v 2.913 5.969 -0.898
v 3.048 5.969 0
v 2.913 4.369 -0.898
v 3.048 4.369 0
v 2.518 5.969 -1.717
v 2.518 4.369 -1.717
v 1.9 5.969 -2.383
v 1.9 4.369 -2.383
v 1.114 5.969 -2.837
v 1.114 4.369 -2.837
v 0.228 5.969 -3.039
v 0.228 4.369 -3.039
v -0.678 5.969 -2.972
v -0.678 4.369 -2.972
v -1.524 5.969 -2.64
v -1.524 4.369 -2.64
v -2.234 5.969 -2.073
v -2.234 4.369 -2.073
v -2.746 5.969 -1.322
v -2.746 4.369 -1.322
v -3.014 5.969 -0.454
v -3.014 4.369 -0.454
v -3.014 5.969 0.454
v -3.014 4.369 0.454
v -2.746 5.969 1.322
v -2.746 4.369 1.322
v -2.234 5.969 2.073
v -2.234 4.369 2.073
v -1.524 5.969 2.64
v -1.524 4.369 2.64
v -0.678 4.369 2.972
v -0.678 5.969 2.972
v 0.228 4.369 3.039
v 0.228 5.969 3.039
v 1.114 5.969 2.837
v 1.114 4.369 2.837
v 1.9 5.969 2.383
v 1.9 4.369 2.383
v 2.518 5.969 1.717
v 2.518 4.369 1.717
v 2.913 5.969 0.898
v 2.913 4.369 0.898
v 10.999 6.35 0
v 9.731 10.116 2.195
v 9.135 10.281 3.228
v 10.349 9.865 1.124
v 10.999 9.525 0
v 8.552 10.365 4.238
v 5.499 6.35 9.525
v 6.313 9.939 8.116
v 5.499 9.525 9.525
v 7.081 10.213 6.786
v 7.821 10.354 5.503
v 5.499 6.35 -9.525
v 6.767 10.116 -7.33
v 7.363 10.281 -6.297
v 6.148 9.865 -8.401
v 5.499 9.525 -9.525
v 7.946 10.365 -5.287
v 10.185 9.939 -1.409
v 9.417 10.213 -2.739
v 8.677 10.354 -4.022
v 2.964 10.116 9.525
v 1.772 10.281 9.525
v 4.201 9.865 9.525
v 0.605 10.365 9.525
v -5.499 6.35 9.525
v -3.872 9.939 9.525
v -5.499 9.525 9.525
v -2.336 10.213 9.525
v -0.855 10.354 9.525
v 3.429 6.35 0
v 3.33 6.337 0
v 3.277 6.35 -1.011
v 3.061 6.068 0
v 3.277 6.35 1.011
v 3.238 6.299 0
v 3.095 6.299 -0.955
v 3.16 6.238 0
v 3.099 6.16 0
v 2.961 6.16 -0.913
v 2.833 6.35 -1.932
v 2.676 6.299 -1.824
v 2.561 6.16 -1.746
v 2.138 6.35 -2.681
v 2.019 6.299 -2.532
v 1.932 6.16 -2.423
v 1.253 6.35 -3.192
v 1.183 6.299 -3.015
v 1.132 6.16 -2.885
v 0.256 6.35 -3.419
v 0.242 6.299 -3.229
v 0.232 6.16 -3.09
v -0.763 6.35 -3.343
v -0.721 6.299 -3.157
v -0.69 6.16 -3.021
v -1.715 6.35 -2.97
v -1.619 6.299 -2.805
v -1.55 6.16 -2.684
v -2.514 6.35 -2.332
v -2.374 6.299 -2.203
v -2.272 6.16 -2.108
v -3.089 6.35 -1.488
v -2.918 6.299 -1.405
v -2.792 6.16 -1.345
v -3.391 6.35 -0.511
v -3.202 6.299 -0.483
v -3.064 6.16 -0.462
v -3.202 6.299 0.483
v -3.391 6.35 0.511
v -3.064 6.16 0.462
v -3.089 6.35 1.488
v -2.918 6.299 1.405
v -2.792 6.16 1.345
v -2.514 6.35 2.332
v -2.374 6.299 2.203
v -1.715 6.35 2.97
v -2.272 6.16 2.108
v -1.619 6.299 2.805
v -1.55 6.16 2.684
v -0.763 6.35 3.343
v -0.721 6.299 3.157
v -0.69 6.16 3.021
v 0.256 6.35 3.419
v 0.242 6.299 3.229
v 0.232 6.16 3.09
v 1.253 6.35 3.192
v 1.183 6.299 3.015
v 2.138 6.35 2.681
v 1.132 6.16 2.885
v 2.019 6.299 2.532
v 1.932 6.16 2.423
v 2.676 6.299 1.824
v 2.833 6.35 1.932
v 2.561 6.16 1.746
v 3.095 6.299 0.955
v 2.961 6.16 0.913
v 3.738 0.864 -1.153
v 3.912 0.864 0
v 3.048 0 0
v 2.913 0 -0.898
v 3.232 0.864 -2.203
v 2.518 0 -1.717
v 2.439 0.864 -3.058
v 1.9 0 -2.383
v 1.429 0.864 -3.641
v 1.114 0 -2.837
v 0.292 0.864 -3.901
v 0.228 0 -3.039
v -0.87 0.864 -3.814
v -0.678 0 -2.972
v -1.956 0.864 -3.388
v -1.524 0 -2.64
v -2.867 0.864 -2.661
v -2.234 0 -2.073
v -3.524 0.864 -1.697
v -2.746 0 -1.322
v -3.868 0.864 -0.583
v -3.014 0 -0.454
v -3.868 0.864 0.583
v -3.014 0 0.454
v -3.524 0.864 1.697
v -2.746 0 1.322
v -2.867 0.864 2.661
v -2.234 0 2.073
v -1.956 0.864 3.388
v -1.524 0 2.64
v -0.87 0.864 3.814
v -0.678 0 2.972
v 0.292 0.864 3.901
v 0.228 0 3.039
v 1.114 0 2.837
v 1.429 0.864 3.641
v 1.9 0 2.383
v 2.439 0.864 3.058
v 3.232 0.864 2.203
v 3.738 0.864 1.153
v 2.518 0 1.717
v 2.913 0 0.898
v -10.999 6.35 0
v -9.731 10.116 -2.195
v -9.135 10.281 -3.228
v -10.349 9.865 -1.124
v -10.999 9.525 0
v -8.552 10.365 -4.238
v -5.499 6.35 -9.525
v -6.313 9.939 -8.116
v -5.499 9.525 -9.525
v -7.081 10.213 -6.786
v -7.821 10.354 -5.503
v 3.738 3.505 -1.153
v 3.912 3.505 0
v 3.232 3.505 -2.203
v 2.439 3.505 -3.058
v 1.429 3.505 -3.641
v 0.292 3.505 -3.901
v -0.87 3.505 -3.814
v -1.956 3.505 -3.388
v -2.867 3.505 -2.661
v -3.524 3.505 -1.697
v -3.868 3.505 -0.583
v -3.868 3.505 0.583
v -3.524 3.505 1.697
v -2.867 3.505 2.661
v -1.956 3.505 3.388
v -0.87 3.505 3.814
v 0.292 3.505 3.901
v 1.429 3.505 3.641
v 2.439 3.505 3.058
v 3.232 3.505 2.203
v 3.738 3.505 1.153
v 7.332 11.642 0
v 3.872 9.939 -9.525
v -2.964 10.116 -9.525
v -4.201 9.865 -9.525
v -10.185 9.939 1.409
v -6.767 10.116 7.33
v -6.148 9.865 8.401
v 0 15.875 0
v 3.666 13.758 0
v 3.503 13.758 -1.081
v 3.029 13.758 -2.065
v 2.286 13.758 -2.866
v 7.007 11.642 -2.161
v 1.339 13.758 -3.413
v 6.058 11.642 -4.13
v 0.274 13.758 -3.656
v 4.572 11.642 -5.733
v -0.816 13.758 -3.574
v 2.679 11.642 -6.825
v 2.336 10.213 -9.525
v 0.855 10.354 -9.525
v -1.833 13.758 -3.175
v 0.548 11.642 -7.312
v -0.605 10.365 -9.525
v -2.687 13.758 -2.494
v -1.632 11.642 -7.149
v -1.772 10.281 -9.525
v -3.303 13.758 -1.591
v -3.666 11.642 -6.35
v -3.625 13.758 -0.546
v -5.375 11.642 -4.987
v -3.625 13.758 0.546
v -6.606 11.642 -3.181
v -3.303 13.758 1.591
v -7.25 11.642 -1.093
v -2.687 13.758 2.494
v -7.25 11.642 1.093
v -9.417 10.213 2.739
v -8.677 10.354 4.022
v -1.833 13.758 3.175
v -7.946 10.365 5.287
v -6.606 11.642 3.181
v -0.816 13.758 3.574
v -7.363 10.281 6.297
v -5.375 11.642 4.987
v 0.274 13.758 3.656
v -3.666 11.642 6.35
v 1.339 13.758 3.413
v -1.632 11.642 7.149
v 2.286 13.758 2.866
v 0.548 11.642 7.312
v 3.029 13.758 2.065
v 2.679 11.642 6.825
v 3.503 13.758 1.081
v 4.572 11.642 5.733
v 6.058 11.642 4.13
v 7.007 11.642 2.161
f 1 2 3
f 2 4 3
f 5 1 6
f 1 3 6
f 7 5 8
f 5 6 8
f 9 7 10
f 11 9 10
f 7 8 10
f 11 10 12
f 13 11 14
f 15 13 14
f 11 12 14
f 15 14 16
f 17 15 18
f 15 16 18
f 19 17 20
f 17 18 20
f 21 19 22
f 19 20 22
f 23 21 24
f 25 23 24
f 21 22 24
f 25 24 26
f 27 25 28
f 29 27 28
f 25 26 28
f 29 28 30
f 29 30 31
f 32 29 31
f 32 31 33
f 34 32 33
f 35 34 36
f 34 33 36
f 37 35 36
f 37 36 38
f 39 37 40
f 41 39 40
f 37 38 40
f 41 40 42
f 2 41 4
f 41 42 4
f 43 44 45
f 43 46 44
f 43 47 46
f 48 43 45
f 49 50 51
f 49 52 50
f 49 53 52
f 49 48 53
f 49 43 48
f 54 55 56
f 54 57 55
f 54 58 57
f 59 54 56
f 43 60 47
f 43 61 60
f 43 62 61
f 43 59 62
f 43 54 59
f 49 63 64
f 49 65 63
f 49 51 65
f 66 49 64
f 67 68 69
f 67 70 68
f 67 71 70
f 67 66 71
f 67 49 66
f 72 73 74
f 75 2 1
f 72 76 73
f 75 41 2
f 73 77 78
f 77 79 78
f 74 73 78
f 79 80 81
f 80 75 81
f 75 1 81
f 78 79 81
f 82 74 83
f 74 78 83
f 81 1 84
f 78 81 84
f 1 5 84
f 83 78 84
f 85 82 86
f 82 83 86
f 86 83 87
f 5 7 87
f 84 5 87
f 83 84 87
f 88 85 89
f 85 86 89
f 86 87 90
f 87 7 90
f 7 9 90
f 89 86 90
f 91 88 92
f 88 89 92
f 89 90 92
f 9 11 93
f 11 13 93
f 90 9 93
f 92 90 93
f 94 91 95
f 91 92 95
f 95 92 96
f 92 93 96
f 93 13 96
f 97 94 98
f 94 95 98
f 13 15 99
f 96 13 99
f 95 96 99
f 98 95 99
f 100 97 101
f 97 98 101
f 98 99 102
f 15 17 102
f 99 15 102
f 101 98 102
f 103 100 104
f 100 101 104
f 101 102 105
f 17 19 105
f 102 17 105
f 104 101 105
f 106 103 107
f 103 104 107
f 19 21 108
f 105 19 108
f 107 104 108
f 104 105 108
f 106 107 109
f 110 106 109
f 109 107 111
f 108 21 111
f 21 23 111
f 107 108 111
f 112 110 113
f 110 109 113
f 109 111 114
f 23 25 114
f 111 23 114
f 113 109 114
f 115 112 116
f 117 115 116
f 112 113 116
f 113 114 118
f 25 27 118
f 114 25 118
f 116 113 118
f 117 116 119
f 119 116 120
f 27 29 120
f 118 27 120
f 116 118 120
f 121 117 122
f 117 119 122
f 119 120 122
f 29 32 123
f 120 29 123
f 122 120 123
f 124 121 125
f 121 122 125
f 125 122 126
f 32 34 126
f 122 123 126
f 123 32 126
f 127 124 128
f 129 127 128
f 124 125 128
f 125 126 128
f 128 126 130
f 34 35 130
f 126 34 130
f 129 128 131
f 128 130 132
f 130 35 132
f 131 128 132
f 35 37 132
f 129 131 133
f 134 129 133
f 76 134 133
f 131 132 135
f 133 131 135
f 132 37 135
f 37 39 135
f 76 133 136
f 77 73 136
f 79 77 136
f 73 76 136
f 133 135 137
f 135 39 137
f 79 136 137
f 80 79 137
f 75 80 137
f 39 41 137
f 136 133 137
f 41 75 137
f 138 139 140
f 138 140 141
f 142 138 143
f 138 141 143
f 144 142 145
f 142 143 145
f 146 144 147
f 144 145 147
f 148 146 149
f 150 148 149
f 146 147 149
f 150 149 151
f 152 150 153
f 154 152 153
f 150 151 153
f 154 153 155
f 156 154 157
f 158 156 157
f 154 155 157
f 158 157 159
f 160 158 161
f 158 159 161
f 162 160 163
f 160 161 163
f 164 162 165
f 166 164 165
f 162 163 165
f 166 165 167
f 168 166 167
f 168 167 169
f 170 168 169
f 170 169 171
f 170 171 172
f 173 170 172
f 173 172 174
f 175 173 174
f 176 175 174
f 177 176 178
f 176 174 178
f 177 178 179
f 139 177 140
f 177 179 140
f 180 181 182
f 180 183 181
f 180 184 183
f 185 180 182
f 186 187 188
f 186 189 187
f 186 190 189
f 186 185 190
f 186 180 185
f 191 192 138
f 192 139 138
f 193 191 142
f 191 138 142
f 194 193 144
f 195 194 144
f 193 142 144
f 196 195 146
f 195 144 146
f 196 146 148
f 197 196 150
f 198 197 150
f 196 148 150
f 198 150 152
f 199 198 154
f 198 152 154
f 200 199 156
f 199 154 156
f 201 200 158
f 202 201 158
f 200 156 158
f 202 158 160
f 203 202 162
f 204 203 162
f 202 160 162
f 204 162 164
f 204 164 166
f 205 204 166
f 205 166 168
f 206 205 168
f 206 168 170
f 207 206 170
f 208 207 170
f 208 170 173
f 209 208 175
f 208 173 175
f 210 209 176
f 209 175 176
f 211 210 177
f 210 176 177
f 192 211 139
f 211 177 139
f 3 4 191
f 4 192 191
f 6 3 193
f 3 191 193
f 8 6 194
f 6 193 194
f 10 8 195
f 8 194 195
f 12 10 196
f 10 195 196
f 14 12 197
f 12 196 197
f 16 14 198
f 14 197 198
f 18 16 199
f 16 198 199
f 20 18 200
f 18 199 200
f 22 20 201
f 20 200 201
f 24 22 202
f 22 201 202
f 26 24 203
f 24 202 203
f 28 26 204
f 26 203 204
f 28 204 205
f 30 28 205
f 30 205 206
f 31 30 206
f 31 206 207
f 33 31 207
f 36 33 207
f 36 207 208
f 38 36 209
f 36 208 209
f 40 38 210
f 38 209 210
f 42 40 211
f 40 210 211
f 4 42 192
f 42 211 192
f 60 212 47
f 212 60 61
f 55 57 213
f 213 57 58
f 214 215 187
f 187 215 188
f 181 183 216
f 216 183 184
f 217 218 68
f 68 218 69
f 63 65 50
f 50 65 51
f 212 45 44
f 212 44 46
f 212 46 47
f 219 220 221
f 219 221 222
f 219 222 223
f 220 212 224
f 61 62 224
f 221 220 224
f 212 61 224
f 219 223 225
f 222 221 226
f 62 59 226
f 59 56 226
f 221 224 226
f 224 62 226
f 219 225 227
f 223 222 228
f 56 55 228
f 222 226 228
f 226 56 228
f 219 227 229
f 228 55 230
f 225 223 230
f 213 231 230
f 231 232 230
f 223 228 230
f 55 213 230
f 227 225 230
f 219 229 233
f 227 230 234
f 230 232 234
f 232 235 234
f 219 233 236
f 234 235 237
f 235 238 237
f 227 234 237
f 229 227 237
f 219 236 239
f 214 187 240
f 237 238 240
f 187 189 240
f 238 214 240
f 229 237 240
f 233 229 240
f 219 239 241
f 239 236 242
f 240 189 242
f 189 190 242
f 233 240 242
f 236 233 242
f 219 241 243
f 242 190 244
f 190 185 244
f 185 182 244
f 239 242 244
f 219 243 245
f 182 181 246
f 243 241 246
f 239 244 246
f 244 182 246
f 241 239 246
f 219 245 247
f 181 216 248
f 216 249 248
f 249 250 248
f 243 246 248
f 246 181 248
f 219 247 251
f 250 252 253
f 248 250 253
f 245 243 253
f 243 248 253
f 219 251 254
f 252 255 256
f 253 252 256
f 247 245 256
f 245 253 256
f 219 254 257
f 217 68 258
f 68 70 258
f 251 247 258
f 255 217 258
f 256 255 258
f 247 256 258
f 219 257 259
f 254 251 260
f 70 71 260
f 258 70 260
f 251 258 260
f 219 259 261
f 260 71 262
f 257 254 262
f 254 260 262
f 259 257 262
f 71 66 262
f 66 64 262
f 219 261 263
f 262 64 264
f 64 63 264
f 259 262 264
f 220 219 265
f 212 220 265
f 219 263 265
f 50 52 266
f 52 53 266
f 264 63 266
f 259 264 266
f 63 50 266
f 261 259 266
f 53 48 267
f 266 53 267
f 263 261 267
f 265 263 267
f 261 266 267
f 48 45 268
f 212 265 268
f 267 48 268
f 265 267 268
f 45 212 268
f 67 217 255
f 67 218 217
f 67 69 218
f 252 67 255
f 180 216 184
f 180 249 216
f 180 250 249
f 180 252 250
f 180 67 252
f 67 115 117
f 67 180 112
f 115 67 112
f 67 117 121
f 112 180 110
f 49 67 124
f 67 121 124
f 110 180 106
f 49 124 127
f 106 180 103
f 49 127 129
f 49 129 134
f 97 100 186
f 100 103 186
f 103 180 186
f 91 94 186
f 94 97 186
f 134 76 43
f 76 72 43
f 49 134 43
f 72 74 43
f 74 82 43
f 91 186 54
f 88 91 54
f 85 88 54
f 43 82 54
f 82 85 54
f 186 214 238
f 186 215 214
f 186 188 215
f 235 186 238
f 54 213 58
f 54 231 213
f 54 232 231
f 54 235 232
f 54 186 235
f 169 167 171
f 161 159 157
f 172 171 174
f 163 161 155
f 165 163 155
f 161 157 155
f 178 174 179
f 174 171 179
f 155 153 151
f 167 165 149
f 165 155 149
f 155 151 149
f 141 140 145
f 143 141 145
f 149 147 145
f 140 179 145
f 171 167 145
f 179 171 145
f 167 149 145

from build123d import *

# Parameters (mm, degrees)
CUT_EXTRUDE2_DEPTH = 15.875


with BuildPart() as part:
    # Sketch3 → Revolve1 (revolve)
    with BuildSketch(Plane.XY):
        with BuildLine():
            Line((0, 15.875), (10.9985175, 9.525002961))
            Line((10.9985175, 9.525002961), (10.9985175, 6.35))
            Line((10.9985175, 6.35), (3.429, 6.35))
            ThreePointArc((3.429, 6.35), (3.159592316, 6.238407684), (3.048, 5.969))
            Line((3.048, 5.969), (3.048, 4.3688))
            Line((3.048, 4.3688), (3.9116, 3.5052))
            Line((3.9116, 3.5052), (3.9116, 0.8636))
            Line((3.9116, 0.8636), (3.048, 0))
            Line((3.048, 0), (0, 0))
            Line((0, 0), (0, 15.875))
        make_face()
    revolve(axis=Axis((0, -1000, 0), (0, 1, 0)))

    # Sketch1 → Cut-Extrude2 (cut)
    with BuildSketch(Plane(origin=(0, 0, 0), x_dir=(1, 0, 0), z_dir=(0, 1, 0))):
        with BuildLine():
            ThreePointArc((-5.499261314, -9.525), (0, -10.998522628), (5.499261314, -9.525))
            Line((5.499261314, -9.525), (-5.499261314, -9.525))
        make_face()
        with BuildLine():
            ThreePointArc((-10.998522628, 0), (-9.525, -5.499261314), (-5.499261314, -9.525))
            Line((-5.499261314, -9.525), (-10.998522628, 0))
        make_face()
        with BuildLine():
            ThreePointArc((5.499261314, -9.525), (9.525, -5.499261314), (10.998522628, 0))
            Line((10.998522628, 0), (5.499261314, -9.525))
        make_face()
        with BuildLine():
            Line((5.499261314, 9.525), (10.998522628, 0))
            ThreePointArc((10.998522628, 0), (9.525, 5.499261314), (5.499261314, 9.525))
        make_face()
        with BuildLine():
            Line((-5.499261314, 9.525), (5.499261314, 9.525))
            ThreePointArc((5.499261314, 9.525), (0, 10.998522628), (-5.499261314, 9.525))
        make_face()
        with BuildLine():
            Line((-10.998522628, 0), (-5.499261314, 9.525))
            ThreePointArc((-5.499261314, 9.525), (-9.525, 5.499261314), (-10.998522628, 0))
        make_face()
    extrude(amount=CUT_EXTRUDE2_DEPTH, mode=Mode.SUBTRACT)


solid = part.part
